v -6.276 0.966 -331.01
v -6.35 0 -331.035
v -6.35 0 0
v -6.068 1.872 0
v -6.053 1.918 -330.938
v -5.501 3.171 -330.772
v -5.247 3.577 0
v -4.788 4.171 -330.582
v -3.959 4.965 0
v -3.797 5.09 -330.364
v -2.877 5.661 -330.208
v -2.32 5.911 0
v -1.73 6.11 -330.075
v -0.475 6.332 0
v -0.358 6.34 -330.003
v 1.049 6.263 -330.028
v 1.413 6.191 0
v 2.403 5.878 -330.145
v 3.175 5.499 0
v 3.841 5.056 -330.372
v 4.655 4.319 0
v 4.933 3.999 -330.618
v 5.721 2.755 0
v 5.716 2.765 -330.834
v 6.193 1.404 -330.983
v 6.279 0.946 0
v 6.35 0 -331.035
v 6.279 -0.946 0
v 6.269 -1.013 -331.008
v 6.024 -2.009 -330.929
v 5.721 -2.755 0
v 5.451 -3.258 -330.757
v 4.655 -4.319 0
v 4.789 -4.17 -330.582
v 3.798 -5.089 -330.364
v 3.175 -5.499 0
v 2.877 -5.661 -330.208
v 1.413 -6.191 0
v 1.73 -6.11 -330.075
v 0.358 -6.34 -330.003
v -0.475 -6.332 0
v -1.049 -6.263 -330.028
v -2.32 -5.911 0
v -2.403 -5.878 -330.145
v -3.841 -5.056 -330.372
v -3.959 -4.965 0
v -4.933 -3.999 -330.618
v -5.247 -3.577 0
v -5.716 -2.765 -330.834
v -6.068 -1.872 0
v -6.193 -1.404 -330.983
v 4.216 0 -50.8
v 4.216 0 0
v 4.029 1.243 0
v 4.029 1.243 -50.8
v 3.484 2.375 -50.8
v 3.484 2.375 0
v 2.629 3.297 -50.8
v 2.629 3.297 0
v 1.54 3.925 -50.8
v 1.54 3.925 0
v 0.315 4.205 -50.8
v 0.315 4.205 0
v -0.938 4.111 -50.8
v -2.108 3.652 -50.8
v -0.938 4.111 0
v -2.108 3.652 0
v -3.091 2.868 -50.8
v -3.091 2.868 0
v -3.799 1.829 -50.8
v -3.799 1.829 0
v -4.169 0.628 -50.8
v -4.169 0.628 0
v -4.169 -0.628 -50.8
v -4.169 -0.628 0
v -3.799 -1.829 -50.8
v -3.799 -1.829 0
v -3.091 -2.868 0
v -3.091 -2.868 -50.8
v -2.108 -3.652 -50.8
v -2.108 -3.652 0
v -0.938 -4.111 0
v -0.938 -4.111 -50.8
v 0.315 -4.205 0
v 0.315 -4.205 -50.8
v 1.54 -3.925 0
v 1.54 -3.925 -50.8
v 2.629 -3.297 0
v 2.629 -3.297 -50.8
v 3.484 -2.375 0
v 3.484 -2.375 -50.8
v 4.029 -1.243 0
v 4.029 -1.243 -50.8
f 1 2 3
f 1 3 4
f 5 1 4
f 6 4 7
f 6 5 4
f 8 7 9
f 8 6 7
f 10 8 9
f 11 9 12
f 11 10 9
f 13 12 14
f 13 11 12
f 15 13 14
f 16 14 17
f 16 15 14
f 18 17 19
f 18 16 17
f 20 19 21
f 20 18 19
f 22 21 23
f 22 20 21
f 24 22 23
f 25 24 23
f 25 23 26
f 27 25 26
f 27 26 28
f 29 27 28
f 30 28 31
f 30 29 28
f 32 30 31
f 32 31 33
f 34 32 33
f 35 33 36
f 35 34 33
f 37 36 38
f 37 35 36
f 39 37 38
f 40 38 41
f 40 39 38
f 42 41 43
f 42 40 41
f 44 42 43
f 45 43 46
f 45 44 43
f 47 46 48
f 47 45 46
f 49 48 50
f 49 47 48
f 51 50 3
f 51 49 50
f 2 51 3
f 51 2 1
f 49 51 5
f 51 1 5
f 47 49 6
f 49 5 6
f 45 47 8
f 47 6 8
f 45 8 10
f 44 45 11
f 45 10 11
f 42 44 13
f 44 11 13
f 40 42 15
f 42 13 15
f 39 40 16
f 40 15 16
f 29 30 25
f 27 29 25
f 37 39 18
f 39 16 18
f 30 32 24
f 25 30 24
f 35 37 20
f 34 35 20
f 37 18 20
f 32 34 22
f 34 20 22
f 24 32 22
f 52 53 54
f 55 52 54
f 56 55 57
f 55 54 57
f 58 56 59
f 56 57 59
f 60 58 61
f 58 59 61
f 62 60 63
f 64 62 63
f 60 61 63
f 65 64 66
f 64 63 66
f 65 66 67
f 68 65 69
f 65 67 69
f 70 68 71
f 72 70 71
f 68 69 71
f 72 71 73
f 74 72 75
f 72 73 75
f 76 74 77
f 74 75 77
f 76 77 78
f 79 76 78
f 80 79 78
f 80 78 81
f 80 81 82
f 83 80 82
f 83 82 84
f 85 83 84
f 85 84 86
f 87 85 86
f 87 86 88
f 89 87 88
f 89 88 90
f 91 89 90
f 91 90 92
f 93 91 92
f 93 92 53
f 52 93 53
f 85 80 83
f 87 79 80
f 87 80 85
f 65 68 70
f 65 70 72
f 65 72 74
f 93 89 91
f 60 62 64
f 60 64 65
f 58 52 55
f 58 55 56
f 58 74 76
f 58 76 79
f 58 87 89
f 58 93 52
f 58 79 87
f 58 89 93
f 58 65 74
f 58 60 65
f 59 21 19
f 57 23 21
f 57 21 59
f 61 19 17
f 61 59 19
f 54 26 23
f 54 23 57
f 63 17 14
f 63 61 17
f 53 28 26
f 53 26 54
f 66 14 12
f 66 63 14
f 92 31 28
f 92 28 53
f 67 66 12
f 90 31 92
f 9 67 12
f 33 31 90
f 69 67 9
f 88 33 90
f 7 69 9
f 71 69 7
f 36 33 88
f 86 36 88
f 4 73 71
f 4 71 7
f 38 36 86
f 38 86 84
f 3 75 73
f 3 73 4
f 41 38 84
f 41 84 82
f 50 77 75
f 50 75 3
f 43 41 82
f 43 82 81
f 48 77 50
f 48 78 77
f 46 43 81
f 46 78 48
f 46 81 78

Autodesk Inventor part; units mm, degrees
ref_plane "YZ Plane" through (0, 0, 0) normal (1, 0, 0) x (0, 1, 0)
ref_plane "XZ Plane" through (0, 0, 0) normal (0, 1, 0) x (-1, 0, 0)
ref_plane "XY Plane" through (0, 0, 0) normal (0, 0, 1) x (1, 0, 0)
sketch "Sketch1" plane through (0, 0, 0) normal (0, 1, 0) x (-1, 0, 0)
  line L0 (0, -456) -> (0, 76) construction
  line L1 (-1.27, 0) -> (7.62, 0) construction
  line L2 (0, 0) -> (6.35, 0)
  line L3 (6.35, 0) -> (6.35, -350)
  line L4 (6.35, -350) -> (0, -350)
  line L5 (0, -350) -> (0, 0)
  dimension "d0" = 350
  dimension "d1" = 6.35
revolve "Revolution1" add sketch "Sketch1" angle 360 about axis through (0, 0, -350) along (0, 0, 1)
sketch "Sketch2" plane through (0, 0, 0) normal (0, 1, 0) x (-1, 0, 0)
  line L0 (6.35, -350) -> (-6.35, -350) projected
  circle A0 centre (0, -350) radius 20
  point P0 (0, 0)
  dimension "d3" = 40
extrude "Extrusion1" cut sketch "Sketch2" along normal through all both and the other way through all
sketch "Sketch3" plane through (0, 0, 0) normal (0, 0, 1) x (1, 0, 0)
  circle A0 centre (0, 0) radius 4.2164
  point P0 (0, 0)
  dimension "d6" = 8.4328
extrude "Extrusion2" cut sketch "Sketch3" against normal blind 50.8
thread "Thread1" size "3/8-24 UNF" class "2B" standard "ANSI Unified Screw Threads" full length
properties part number "Suspenion_Arm_Assembly_V2_Member"
